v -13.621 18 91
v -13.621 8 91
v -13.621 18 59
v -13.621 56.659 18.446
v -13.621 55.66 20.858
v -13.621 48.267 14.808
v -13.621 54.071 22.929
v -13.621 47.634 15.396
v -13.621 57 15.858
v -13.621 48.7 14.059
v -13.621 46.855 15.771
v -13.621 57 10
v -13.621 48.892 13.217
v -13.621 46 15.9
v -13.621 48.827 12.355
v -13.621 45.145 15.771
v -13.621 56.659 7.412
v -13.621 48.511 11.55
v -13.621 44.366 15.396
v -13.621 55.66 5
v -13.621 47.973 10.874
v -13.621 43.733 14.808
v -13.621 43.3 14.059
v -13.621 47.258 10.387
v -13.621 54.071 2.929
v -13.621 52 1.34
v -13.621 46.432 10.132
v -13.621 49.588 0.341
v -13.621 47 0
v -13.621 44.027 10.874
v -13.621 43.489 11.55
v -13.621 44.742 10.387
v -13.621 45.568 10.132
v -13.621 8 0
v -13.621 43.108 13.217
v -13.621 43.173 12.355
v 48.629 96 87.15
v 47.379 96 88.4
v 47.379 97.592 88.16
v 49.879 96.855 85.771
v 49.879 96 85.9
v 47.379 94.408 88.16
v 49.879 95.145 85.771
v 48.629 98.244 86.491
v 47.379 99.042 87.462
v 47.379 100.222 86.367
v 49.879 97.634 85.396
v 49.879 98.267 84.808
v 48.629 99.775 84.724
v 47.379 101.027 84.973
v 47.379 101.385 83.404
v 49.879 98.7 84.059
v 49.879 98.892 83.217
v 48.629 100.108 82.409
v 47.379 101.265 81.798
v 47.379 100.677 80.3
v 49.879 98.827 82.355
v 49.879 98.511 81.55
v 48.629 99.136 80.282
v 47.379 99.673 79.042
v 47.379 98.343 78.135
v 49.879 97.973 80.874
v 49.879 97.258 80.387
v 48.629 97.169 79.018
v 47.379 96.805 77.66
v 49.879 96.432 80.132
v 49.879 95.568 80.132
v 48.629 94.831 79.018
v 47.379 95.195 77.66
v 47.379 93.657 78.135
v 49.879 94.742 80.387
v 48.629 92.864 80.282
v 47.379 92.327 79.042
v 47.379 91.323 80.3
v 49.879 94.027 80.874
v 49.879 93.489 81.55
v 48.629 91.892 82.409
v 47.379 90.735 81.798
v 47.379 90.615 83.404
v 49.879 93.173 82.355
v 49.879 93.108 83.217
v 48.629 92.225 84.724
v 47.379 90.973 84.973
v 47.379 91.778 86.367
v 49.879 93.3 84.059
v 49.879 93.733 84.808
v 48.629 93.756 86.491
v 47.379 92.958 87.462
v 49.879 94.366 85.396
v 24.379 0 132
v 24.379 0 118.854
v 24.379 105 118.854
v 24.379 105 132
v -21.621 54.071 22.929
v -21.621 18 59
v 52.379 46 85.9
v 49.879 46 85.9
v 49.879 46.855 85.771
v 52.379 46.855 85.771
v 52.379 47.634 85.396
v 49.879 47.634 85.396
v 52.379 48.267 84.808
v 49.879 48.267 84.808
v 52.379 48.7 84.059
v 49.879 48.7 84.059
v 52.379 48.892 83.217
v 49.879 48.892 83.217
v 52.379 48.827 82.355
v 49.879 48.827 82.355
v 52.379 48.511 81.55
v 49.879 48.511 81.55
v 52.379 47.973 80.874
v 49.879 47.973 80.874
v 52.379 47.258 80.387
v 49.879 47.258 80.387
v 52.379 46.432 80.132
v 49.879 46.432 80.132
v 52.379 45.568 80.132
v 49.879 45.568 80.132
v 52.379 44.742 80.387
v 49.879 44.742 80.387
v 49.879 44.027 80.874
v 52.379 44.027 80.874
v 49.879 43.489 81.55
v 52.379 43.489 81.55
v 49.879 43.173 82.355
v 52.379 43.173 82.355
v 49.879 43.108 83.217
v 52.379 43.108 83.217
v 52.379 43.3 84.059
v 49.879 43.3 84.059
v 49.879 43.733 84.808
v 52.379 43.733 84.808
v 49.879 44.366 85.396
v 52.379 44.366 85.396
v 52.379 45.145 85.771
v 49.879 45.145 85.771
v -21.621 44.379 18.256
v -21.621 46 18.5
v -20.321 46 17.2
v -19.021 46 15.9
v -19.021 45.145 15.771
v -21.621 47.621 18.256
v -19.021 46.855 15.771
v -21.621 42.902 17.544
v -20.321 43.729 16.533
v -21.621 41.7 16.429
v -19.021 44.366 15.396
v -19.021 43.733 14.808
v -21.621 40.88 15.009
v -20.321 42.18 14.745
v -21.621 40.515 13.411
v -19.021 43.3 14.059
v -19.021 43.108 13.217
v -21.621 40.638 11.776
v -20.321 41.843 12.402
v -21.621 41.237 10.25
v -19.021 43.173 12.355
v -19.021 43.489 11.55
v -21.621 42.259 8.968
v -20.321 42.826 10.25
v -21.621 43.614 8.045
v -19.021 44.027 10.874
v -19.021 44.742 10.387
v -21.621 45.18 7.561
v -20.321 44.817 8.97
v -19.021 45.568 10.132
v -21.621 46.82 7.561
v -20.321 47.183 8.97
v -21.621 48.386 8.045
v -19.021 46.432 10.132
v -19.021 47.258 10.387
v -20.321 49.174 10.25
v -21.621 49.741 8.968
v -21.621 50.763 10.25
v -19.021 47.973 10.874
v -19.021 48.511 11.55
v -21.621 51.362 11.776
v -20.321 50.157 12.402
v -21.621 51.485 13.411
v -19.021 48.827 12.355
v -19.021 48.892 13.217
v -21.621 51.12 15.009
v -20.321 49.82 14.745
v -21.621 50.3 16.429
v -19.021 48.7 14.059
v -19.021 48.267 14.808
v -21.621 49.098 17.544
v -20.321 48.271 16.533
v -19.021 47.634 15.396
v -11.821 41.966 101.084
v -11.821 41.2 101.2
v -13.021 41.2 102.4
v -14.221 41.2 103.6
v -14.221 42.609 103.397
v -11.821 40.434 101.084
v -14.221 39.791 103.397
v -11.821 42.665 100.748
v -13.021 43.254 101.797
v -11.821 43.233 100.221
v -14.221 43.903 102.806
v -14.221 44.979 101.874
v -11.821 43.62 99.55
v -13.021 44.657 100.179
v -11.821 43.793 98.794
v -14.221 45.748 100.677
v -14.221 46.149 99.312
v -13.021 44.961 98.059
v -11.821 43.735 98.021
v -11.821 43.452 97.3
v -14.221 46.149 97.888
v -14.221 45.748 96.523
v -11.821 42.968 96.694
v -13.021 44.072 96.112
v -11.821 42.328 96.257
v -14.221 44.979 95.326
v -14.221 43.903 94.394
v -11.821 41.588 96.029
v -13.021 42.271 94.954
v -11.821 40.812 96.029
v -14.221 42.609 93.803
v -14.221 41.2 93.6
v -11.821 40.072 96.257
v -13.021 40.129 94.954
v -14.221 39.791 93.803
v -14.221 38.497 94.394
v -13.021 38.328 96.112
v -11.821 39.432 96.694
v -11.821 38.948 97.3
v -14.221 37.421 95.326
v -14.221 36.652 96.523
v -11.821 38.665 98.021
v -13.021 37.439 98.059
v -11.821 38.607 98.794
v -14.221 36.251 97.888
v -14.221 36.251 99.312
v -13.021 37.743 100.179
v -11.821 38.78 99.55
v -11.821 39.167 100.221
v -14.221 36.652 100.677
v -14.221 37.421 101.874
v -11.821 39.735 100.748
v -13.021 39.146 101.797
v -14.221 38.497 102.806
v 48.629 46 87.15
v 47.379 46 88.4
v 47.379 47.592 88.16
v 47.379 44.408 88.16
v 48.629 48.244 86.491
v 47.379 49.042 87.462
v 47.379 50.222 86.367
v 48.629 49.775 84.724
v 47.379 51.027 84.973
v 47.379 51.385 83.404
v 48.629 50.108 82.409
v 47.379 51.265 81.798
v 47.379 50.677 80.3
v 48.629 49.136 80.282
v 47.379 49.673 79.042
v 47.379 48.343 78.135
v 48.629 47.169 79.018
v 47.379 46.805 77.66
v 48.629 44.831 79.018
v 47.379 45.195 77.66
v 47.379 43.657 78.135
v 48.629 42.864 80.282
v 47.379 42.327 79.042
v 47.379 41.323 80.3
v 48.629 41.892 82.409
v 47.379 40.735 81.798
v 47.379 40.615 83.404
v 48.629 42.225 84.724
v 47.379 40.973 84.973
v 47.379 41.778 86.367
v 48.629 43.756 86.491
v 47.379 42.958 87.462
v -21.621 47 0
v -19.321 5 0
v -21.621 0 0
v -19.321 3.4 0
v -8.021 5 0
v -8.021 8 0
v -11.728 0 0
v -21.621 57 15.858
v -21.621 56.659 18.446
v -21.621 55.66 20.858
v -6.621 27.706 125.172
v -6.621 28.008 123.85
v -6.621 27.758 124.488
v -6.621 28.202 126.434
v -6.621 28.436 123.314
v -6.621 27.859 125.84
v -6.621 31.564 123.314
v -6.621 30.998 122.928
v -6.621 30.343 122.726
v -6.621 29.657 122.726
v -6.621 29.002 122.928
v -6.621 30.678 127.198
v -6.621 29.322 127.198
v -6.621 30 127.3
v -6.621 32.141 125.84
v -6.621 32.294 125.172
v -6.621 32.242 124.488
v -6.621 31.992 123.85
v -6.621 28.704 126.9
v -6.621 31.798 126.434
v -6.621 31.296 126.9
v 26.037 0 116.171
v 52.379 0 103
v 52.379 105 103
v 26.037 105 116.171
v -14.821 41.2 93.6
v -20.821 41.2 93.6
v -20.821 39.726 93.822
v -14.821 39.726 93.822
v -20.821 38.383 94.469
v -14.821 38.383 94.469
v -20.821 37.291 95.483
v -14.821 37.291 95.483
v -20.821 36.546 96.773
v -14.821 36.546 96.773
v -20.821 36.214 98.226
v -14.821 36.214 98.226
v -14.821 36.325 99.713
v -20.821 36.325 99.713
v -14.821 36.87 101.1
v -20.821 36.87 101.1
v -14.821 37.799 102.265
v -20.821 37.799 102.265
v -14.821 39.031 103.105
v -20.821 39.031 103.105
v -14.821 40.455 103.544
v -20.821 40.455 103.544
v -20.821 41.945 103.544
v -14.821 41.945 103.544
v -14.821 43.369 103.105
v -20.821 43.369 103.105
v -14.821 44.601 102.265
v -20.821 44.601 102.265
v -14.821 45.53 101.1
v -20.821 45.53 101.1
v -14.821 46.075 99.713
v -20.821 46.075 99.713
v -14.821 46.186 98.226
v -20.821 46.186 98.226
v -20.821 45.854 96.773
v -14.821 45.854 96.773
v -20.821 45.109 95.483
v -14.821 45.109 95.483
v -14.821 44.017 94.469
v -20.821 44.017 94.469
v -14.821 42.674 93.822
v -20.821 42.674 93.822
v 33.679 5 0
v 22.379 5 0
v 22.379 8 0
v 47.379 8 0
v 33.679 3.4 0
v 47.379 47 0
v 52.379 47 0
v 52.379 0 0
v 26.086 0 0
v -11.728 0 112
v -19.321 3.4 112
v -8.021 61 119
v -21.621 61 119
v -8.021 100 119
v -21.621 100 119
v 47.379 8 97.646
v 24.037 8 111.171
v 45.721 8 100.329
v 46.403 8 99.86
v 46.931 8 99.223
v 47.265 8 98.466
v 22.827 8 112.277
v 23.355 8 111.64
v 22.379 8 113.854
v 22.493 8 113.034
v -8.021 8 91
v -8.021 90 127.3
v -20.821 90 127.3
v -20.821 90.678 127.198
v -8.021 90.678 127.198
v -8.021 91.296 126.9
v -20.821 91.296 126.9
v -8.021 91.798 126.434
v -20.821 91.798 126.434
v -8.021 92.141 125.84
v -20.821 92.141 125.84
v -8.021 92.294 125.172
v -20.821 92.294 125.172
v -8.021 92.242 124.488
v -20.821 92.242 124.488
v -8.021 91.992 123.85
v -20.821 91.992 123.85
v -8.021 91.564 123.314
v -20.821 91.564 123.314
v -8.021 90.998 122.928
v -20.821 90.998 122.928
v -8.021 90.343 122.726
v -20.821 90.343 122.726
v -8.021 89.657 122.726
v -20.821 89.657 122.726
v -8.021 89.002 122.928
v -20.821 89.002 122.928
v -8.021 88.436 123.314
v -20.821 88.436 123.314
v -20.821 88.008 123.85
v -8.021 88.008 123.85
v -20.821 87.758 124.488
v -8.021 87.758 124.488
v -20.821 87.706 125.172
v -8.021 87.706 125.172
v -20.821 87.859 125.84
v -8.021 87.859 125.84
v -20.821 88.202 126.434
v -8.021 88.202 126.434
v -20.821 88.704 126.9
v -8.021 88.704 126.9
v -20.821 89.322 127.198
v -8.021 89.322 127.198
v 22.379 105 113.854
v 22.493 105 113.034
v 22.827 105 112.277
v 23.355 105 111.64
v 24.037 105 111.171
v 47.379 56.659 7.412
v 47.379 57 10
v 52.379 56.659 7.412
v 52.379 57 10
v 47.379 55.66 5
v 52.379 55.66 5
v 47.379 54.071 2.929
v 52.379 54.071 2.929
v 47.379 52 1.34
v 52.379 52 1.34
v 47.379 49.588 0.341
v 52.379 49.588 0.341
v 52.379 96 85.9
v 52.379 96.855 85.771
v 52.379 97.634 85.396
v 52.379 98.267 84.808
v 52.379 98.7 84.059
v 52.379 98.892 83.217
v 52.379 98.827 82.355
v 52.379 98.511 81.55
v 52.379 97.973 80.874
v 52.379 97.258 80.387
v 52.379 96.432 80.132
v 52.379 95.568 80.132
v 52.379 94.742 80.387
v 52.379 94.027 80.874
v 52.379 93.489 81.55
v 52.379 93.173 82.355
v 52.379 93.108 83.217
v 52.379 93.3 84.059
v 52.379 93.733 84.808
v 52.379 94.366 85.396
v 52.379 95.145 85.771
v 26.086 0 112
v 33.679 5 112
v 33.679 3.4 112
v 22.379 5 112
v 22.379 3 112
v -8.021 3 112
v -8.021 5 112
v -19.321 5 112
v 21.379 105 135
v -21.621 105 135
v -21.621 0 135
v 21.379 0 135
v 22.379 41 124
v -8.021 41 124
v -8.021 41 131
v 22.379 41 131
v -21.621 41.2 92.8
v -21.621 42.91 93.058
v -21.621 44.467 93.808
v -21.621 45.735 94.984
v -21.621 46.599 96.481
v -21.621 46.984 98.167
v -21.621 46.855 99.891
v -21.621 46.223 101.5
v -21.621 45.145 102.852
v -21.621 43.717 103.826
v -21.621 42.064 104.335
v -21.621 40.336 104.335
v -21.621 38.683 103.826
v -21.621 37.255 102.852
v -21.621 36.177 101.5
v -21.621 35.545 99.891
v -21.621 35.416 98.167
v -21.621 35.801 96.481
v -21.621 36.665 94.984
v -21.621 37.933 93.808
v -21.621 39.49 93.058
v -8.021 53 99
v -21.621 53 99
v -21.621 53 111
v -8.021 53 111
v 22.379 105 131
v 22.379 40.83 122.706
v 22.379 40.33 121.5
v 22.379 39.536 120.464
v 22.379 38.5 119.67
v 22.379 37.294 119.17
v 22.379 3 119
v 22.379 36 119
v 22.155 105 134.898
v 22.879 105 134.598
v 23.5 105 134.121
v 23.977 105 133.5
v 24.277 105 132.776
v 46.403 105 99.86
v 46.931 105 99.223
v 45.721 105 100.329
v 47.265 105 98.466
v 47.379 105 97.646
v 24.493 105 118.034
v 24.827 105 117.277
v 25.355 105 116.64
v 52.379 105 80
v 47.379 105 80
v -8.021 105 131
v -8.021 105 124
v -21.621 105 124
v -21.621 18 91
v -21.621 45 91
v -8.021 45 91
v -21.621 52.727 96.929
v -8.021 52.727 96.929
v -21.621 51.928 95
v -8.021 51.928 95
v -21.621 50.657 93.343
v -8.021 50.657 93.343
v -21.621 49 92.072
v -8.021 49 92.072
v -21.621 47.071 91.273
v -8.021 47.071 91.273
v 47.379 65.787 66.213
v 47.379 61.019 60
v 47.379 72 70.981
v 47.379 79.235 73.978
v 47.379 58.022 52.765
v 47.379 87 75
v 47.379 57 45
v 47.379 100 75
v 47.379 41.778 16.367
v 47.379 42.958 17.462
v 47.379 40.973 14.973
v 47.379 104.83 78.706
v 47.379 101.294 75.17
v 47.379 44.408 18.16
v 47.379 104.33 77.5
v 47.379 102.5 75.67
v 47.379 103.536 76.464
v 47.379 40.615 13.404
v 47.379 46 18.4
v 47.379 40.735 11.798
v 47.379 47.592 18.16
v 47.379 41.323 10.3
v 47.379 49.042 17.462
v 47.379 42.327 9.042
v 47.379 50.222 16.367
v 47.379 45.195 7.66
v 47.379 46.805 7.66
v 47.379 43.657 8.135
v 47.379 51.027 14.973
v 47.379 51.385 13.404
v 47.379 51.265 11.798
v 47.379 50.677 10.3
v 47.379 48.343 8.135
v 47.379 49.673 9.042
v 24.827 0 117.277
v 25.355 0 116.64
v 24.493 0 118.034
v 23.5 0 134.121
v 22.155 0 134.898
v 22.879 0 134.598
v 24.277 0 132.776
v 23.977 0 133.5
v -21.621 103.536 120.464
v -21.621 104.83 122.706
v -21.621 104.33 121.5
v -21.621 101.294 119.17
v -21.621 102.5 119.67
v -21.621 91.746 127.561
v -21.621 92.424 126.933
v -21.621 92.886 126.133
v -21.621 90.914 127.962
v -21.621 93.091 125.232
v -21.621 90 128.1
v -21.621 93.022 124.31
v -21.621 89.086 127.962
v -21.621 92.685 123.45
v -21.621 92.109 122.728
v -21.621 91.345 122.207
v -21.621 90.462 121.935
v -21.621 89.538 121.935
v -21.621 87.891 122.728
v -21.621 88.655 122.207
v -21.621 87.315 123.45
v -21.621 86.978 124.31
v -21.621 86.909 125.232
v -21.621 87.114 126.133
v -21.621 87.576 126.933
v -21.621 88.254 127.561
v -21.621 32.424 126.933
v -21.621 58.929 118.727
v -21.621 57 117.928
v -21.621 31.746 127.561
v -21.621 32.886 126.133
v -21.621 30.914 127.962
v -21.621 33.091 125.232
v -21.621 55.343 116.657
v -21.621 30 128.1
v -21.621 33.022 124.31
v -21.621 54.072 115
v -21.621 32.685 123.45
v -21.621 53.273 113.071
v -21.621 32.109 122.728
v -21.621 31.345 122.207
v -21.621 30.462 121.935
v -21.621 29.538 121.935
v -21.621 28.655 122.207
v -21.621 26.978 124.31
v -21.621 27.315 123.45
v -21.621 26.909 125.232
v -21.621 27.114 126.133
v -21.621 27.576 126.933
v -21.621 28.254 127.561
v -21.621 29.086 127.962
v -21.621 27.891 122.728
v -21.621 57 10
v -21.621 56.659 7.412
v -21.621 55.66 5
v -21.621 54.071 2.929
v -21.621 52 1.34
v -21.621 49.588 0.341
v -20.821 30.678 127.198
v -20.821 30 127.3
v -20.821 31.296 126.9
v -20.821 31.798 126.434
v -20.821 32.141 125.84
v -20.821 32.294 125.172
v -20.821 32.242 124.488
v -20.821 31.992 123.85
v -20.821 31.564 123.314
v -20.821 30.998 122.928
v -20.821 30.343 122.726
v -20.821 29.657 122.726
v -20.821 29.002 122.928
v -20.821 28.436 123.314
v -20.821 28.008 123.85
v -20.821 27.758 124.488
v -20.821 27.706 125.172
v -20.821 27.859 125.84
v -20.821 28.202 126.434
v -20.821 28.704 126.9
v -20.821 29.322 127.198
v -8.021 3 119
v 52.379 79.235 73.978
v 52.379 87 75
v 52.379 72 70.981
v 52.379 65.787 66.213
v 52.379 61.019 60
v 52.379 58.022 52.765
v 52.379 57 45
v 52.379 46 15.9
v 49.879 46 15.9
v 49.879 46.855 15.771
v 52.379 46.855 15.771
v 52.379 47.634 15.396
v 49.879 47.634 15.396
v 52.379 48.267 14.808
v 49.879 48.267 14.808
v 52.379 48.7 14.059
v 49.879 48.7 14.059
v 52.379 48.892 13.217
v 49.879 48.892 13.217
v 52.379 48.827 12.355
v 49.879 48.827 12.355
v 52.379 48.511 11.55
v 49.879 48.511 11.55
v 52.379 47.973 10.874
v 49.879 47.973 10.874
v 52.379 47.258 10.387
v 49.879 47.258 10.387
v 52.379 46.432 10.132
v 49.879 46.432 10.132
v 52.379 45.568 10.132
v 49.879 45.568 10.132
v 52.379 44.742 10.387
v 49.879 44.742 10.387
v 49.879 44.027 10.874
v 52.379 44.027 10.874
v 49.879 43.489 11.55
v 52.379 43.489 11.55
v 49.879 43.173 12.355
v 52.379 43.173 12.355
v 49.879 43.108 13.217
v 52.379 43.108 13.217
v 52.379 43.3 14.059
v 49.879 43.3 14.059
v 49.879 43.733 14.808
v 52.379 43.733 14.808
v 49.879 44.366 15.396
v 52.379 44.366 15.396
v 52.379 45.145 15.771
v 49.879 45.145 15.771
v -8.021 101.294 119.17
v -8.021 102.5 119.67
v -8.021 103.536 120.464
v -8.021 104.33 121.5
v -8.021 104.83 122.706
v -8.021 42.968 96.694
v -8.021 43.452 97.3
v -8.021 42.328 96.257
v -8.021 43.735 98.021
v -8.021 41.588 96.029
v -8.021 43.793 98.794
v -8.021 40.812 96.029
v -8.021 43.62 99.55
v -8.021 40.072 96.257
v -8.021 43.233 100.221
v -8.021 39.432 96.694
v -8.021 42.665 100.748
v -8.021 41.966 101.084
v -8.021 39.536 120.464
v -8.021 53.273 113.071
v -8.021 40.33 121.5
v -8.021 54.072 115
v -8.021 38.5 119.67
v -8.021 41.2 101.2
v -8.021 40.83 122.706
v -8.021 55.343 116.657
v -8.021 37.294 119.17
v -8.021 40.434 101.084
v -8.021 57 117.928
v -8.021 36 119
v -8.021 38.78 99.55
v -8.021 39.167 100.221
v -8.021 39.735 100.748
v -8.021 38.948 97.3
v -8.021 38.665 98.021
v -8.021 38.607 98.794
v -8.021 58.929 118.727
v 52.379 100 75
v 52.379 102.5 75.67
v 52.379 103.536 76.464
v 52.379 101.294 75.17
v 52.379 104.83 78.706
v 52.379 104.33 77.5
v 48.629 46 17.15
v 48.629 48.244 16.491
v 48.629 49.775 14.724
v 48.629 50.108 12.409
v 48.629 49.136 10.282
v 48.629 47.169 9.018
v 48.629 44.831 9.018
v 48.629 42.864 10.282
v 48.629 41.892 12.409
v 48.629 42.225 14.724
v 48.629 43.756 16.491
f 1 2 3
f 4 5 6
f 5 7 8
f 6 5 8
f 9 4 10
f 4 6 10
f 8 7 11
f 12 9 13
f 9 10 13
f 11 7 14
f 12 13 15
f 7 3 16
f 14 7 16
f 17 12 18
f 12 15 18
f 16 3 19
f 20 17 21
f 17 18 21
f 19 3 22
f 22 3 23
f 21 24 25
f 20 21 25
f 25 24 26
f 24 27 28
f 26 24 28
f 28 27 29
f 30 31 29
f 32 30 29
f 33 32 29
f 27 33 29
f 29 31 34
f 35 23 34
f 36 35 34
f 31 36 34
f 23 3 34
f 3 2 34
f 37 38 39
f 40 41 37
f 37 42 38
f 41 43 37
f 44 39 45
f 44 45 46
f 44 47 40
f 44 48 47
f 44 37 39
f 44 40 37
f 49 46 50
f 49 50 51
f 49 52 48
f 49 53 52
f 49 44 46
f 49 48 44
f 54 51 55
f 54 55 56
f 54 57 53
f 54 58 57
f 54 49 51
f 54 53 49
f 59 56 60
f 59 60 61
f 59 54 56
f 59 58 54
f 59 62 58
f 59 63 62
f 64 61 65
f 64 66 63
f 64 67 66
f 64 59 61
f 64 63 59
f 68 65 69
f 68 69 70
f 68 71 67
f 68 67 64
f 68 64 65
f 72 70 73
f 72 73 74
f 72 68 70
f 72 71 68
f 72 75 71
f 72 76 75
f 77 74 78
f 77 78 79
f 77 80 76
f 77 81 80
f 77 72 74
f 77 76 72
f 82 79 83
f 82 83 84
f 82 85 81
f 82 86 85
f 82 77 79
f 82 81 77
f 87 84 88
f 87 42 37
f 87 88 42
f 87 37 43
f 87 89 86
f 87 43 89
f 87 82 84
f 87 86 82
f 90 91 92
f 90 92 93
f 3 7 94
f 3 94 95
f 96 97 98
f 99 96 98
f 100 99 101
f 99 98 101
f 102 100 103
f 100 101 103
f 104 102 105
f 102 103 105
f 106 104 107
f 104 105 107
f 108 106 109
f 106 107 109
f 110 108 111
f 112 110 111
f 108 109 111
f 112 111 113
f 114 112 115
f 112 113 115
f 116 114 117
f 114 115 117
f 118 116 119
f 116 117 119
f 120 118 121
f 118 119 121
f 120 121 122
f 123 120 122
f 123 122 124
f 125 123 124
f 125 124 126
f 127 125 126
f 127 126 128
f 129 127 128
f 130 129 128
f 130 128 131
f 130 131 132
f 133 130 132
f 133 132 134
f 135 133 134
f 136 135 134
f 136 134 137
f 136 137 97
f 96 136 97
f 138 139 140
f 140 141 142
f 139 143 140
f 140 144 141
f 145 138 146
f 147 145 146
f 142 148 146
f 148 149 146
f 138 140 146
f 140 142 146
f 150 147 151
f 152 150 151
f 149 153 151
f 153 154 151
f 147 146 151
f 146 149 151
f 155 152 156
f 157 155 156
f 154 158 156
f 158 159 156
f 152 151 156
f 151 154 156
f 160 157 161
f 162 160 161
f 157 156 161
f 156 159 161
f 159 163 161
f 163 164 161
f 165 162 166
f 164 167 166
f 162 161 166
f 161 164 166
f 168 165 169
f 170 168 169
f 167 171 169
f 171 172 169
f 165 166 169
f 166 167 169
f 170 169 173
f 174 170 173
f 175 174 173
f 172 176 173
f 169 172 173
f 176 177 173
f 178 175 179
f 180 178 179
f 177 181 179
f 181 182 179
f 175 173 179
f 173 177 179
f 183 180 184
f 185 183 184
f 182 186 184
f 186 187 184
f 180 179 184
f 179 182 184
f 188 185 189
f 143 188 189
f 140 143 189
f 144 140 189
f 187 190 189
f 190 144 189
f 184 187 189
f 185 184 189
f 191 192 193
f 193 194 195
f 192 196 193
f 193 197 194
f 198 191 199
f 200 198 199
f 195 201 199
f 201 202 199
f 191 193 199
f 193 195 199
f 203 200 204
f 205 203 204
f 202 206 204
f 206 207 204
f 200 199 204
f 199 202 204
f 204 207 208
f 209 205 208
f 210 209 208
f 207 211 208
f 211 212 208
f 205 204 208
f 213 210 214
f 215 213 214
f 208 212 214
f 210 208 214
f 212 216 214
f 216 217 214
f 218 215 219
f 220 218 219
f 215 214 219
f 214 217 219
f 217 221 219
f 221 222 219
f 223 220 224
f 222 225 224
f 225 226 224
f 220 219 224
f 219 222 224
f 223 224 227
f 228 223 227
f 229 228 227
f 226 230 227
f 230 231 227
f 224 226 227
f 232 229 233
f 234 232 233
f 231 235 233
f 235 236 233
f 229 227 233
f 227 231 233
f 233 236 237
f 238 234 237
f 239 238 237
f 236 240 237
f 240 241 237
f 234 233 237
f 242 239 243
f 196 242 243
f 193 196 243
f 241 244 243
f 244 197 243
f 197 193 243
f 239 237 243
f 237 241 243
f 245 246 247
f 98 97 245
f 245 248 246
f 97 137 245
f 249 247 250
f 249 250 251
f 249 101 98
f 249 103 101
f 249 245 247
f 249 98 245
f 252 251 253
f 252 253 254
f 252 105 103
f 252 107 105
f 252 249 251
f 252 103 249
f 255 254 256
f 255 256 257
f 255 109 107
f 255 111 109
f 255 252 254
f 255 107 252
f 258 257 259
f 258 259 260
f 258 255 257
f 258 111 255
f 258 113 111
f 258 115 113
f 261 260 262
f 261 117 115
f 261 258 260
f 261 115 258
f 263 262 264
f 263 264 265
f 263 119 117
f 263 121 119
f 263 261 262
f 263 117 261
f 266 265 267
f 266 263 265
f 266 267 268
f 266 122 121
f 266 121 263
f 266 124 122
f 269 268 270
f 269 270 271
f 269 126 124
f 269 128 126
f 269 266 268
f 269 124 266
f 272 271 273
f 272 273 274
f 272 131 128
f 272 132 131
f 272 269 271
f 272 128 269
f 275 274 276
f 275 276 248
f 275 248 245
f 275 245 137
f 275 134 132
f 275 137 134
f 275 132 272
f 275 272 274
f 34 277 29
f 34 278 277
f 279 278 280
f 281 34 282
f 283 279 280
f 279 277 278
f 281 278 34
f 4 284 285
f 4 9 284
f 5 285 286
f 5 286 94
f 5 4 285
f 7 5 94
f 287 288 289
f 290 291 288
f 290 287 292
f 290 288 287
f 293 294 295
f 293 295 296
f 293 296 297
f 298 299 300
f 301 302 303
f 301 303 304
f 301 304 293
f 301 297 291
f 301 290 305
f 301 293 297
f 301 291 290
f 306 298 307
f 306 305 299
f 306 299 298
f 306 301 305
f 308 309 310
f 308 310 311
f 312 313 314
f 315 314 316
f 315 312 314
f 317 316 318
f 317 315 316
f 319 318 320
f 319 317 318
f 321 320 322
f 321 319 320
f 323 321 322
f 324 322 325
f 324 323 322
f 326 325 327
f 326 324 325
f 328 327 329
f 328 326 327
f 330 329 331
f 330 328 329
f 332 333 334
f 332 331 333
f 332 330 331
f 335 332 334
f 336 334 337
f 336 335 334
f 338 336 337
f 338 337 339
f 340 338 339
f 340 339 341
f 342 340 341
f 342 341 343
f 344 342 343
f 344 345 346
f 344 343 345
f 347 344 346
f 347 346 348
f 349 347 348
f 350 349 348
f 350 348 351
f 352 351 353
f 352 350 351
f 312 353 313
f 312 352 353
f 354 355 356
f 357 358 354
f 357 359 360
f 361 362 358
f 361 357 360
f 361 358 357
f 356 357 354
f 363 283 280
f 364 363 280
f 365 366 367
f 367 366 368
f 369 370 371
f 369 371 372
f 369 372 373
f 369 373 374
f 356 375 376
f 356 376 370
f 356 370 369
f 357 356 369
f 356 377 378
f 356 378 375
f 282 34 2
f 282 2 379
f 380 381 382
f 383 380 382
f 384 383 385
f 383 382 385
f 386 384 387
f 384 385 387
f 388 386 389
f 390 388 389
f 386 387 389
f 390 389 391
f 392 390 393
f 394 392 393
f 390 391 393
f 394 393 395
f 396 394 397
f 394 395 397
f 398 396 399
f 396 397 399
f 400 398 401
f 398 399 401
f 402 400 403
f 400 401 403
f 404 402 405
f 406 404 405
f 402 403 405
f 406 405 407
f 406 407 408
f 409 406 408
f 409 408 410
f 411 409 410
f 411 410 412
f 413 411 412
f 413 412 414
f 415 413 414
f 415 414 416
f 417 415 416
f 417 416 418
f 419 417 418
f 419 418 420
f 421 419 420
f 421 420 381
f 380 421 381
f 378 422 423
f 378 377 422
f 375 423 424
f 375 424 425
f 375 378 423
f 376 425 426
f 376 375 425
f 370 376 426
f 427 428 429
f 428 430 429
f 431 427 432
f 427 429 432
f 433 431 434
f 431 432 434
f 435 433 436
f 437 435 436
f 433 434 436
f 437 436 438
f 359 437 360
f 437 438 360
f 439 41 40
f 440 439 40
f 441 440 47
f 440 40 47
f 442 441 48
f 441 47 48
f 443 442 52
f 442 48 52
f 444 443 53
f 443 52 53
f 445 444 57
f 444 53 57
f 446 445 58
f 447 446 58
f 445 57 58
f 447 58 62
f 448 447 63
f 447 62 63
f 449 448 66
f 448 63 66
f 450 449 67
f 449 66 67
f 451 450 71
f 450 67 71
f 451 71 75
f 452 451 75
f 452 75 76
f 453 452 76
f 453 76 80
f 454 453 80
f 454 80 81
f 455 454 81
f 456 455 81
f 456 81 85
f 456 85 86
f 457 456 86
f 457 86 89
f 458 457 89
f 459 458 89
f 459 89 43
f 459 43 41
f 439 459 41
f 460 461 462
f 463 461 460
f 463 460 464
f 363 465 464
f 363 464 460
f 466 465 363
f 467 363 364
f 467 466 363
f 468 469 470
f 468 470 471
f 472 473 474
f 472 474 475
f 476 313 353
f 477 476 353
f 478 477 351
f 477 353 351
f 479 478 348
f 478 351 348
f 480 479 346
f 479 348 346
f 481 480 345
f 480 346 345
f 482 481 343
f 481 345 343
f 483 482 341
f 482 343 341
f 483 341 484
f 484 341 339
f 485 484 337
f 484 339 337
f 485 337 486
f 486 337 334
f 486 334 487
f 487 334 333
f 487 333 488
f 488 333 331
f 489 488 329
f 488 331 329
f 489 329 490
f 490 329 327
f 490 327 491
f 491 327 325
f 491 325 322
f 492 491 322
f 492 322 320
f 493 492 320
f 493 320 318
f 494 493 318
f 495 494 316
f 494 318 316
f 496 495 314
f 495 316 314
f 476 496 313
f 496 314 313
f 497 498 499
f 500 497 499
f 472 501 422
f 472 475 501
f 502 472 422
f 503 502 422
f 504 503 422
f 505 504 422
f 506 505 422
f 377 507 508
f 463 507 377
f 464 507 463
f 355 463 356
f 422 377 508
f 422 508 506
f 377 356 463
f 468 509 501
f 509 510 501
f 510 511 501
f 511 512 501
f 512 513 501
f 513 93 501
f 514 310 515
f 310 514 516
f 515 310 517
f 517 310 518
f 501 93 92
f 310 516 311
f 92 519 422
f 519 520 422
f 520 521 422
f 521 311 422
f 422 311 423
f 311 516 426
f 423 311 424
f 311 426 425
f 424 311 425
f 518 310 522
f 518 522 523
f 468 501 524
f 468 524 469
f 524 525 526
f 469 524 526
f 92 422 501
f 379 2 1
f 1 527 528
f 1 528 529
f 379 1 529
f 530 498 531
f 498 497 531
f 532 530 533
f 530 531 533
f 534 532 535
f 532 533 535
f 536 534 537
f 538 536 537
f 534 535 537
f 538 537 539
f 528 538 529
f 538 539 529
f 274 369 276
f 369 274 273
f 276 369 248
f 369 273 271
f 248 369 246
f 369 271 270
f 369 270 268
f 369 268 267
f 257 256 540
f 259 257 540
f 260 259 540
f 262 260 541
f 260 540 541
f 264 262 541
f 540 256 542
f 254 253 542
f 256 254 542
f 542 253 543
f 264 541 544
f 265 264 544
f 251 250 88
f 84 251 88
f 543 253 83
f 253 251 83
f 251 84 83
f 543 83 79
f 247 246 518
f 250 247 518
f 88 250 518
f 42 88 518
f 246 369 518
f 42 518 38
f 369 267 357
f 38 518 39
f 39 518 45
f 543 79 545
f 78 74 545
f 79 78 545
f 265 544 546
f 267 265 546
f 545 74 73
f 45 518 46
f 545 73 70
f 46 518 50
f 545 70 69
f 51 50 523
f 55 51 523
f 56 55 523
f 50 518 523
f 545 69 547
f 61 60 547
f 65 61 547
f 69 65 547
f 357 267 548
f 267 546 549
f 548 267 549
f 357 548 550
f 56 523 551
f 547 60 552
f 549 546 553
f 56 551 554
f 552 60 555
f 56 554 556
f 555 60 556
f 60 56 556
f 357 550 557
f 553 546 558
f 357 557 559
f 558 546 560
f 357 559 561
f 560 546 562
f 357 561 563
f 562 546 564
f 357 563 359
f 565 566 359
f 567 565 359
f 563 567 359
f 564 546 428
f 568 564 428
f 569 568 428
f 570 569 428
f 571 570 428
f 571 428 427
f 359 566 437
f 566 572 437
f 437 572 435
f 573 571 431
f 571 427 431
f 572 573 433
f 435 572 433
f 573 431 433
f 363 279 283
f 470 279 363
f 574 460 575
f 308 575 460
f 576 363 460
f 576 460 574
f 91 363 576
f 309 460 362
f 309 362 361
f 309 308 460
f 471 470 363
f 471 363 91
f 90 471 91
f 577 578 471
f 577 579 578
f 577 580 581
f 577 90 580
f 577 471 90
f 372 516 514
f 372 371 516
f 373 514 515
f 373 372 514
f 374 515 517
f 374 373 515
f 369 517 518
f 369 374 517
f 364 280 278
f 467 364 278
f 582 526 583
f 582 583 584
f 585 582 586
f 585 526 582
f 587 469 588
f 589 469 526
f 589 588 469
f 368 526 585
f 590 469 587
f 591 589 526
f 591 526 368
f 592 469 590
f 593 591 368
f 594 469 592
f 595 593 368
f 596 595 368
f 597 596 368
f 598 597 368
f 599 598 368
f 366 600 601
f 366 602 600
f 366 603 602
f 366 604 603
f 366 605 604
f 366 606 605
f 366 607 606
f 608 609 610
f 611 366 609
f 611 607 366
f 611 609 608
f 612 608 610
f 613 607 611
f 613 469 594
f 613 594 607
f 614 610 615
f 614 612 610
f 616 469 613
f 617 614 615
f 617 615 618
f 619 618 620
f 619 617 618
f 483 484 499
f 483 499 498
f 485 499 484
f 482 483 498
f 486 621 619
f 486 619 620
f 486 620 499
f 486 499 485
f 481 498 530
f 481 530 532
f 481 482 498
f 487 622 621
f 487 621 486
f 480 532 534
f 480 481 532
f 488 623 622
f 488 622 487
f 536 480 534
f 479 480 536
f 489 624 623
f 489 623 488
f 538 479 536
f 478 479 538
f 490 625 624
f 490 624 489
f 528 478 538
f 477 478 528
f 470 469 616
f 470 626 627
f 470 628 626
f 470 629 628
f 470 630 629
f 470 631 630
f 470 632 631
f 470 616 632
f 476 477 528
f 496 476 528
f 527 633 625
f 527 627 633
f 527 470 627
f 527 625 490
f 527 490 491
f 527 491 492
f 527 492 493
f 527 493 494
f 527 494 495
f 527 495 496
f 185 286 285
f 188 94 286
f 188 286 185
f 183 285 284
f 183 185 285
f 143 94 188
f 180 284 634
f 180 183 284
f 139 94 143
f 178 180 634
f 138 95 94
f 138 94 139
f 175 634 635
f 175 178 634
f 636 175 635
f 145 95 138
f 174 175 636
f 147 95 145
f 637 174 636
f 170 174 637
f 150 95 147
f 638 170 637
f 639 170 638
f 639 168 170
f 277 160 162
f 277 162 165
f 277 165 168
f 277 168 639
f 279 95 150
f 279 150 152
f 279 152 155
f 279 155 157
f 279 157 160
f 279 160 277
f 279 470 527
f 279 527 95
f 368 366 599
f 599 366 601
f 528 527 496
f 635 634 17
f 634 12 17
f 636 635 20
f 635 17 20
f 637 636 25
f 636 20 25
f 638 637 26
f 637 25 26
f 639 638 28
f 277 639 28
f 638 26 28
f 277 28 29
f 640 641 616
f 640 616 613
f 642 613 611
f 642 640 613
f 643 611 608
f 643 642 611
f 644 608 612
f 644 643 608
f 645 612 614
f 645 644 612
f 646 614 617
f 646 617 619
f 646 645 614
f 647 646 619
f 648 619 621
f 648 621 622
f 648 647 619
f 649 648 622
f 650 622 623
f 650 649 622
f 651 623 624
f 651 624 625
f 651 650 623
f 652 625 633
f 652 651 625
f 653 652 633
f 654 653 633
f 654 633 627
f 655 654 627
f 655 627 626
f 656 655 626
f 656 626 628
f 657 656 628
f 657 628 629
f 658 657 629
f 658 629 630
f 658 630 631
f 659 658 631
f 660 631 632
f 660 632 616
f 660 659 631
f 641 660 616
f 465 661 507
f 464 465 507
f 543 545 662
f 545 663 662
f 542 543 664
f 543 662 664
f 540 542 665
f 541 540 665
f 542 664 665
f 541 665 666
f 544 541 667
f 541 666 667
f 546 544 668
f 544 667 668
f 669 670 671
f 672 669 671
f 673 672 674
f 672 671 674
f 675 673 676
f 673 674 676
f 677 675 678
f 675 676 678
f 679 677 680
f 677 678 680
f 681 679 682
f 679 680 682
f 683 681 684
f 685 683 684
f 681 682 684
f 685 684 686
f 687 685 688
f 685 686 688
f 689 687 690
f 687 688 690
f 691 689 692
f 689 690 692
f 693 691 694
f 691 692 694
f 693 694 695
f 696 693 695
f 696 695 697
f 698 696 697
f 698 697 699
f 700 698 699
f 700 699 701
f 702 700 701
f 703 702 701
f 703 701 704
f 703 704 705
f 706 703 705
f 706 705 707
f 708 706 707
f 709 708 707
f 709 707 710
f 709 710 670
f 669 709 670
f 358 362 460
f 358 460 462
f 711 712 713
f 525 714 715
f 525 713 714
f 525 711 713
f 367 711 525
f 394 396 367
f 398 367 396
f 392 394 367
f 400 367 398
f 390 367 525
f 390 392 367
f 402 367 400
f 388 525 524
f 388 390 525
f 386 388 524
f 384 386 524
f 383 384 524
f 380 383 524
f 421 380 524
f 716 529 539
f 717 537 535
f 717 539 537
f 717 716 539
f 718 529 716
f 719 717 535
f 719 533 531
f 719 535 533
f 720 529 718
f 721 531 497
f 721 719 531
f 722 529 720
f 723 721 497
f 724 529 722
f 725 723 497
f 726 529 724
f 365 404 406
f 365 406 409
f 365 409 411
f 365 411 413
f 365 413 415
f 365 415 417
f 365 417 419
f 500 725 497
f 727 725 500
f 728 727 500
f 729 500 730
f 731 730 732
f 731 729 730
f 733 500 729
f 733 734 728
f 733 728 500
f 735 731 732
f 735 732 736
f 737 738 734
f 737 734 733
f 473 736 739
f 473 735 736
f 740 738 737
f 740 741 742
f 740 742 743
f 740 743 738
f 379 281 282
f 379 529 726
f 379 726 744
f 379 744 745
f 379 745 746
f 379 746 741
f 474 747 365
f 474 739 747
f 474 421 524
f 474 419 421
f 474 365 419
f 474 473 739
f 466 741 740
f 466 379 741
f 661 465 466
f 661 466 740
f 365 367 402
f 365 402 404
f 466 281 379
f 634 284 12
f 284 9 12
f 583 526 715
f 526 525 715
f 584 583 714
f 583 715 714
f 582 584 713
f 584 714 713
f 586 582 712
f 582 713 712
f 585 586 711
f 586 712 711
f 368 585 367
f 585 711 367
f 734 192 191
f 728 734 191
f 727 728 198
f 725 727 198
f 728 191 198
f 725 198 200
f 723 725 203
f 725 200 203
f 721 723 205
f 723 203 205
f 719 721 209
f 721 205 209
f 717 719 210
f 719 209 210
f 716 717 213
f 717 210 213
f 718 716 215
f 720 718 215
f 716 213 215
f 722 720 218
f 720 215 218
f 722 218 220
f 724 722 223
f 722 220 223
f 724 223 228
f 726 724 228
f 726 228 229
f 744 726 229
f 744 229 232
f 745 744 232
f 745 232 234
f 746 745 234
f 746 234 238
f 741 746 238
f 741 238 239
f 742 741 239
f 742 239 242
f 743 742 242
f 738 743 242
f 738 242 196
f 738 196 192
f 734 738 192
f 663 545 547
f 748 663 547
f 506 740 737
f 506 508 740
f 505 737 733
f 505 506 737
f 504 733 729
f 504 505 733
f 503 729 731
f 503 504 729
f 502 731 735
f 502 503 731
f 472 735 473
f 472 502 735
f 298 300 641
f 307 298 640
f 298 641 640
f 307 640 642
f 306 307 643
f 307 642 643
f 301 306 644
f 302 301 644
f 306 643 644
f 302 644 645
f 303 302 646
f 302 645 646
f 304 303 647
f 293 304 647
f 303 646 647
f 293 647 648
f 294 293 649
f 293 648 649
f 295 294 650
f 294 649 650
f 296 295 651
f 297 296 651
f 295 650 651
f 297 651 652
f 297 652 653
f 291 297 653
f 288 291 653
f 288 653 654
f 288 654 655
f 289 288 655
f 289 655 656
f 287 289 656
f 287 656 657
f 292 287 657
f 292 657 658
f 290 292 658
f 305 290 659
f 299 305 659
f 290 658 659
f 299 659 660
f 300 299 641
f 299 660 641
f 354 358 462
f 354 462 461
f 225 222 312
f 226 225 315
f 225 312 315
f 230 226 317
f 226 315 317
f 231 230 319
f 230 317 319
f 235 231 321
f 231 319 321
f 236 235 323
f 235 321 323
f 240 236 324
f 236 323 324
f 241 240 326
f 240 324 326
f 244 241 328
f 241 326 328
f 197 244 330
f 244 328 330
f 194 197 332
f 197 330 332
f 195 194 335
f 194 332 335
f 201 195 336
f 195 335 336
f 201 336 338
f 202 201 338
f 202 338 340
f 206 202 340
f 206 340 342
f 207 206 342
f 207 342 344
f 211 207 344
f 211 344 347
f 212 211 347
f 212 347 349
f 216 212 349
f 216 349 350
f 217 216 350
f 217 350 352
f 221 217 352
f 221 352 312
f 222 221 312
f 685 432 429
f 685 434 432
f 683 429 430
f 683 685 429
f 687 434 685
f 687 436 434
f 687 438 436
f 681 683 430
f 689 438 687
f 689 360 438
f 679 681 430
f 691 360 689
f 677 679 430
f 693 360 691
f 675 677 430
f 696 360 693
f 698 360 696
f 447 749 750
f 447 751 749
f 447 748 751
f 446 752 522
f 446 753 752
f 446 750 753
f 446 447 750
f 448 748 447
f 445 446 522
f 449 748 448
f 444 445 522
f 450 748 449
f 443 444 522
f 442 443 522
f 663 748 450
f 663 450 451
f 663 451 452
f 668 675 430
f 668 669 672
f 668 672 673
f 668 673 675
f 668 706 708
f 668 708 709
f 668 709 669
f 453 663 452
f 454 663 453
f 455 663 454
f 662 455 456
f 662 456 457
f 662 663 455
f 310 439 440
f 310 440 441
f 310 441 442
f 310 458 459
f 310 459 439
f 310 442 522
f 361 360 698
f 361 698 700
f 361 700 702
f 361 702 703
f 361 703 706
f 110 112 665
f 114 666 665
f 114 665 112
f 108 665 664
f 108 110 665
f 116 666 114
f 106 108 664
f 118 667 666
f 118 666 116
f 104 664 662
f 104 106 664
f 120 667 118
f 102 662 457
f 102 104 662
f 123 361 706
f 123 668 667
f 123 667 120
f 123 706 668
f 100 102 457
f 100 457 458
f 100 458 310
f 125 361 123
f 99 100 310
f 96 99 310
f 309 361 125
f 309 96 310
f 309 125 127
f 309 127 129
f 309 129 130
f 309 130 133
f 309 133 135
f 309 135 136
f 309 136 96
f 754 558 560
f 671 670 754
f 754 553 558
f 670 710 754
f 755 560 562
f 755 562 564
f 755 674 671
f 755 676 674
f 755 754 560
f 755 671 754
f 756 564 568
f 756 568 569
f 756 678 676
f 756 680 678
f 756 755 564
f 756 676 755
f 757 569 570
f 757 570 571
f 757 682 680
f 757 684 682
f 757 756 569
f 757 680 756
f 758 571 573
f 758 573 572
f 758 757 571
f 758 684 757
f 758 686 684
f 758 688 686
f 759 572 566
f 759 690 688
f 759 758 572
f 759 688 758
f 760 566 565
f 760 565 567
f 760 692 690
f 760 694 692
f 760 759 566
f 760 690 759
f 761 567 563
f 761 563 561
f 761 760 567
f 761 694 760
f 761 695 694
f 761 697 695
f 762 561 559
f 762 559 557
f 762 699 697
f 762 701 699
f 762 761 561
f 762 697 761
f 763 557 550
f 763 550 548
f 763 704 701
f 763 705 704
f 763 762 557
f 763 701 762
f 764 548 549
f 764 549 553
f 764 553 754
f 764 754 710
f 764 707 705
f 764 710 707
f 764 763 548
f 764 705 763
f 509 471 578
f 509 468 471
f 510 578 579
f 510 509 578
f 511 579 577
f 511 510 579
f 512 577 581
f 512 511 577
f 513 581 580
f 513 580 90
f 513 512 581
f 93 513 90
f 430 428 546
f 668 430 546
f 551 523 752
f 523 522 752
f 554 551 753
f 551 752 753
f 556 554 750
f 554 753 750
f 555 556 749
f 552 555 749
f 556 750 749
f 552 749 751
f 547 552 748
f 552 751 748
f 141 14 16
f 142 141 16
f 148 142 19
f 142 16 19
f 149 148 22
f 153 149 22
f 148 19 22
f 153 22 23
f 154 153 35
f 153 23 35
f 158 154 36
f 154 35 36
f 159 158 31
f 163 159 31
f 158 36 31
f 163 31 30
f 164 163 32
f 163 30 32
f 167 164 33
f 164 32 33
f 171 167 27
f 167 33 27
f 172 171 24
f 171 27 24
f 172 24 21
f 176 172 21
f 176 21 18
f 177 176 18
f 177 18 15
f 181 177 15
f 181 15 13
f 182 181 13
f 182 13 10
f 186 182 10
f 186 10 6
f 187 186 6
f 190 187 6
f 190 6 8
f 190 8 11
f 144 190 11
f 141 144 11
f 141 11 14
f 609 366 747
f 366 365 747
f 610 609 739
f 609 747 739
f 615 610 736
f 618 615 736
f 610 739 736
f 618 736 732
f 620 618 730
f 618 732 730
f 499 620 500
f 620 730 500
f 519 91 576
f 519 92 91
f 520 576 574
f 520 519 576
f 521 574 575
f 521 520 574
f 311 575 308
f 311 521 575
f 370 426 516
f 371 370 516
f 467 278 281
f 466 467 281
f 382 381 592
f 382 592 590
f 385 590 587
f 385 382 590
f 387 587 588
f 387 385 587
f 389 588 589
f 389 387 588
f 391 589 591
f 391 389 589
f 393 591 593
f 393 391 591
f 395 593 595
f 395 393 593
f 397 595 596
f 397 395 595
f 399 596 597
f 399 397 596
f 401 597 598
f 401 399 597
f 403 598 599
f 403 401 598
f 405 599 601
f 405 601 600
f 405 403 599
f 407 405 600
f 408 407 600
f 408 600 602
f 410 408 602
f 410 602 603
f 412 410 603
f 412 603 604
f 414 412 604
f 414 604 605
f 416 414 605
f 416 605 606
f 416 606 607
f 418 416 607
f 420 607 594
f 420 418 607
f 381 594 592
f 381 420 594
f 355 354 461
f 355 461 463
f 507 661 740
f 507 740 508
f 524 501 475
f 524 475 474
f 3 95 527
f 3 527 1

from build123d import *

# Parameters (mm, degrees)
EXTRUDE_1_DEPTH          = 105
SKETCH_7_W               = 30.4
SKETCH_7_H               = 19
EXTRUDE_2_DEPTH          = 3
SKETCH_8_W               = 30.4
SKETCH_8_H               = 12
EXTRUDE_3_DEPTH          = 38
FILLET_1_R               = 5
CUT_EXTRUDE_1_DEPTH      = 112
CUT_EXTRUDE_2_DEPTH      = 97
CUT_EXTRUDE_4_DEPTH      = 187.349134691
CUT_EXTRUDE_4_DEPTH_BACK = 6.8
SKETCH_11_R              = 5
FILLET_3_R               = 3
SKETCH_12_R              = 2.6
CUT_EXTRUDE_5_DEPTH      = 20
CHAMFER_1_SIZE           = 3
SKETCH_13_R              = 2.9
CUT_EXTRUDE_6_DEPTH      = 187.349134691
CHAMFER_3_SIZE           = 2.5
SKETCH_16_W              = 75
SKETCH_16_H              = 48
CUT_EXTRUDE_9_DEPTH      = 187.349134691
FILLET_4_R               = 30
SKETCH_17_W              = 28
SKETCH_17_H              = 52
CUT_EXTRUDE_10_DEPTH     = 20
FILLET_5_R               = 8
SKETCH_18_W              = 8
SKETCH_18_H              = 19
EXTRUDE_4_DEPTH          = 49
CHAMFER_4_SIZE           = 50
FILLET_6_R               = 10
SKETCH_19_R              = 2.9
CUT_EXTRUDE_11_DEPTH     = 187.349134691
CHAMFER_5_SIZE           = 2.6
SKETCH_21_R              = 2.3
CUT_EXTRUDE_13_DEPTH     = 15
FILLET_7_R               = 5
CHAMFER_6_SIZE           = 0.8
SKETCH_22_W              = 8
SKETCH_22_H              = 43.683816014
EXTRUDE_5_DEPTH          = 10
FILLET_8_R               = 10


with BuildPart() as part:
    # Эскиз2 → Бобышка-Вытянуть1 (new body)
    with BuildSketch(Plane(origin=(0, 0, 0), x_dir=(1, 0, 0), z_dir=(0, 1, 0))):
        Polygon((52.378939236, 0), (52.378939236, -103), (24.378939236, -117), (24.378939236, -135), (0, -135), (-21.621060764, -135), (-21.621060764, 0), (-8.021060764, 0), (-8.021060764, -131), (0, -131), (22.378939236, -131), (22.378939236, 0), align=None)
    extrude(amount=EXTRUDE_1_DEPTH)



with BuildPart() as body_2:
    # Эскиз7 → Бобышка-Вытянуть2 (new body)
    with BuildSketch(Plane.XZ):
        with Locations((7.178939236, 121.5)):
            Rectangle(SKETCH_7_W, SKETCH_7_H)
    extrude(amount=-EXTRUDE_2_DEPTH)


with BuildPart() as part_1:
    add(part.part)

    add(body_2.part)  # Бобышка-Вытянуть3 merges body 2
    # Эскиз8 → Бобышка-Вытянуть3 (add)
    with BuildSketch(Plane(origin=(0, 3, 0), x_dir=(1, 0, 0), z_dir=(0, 1, 0))):
        with Locations((7.178939236, -125)):
            Rectangle(SKETCH_8_W, SKETCH_8_H)
    extrude(amount=EXTRUDE_3_DEPTH)

    # Скругление1
    fillet_1_edges = [part_1.edges().sort_by_distance(p)[0] for p in [
        (7.178939236, 41, 119),
    ]]
    fillet(fillet_1_edges, radius=FILLET_1_R)

    # Эскиз3 → Вырез-Вытянуть1 (cut)
    with BuildSketch(Plane(origin=(0, 0, 0), x_dir=(-1, 0, 0), z_dir=(0, 0, -1))):
        Polygon((8.021060764, -1.66), (19.321060764, 3.4), (19.321060764, 5), (8.021060764, 5), align=None)
        Polygon((-33.678939236, 5), (-22.378939236, 5), (-22.378939236, -1.66), (-33.678939236, 3.4), align=None)
    extrude(amount=-CUT_EXTRUDE_1_DEPTH, mode=Mode.SUBTRACT)

    # Эскиз9 → Вырез-Вытянуть2 (cut)
    with BuildSketch(Plane(origin=(0, 105, 0), x_dir=(1, 0, 0), z_dir=(0, 1, 0))):
        Polygon((-21.621060764, 0), (-21.621060764, -91), (22.378939236, -91), (22.378939236, -112), (47.378939236, -99.5), (47.378939236, 0), align=None)
    extrude(amount=-CUT_EXTRUDE_2_DEPTH, mode=Mode.SUBTRACT)

    # Эскиз11 → Вырез-Вытянуть4 (cut, two sides: drawn at the far end of the back side and taken through both)
    with BuildSketch(Plane.ZY.offset(21.621060764).offset(-CUT_EXTRUDE_4_DEPTH_BACK)):
        with Locations(Location((98.6, 41.2, 0), (0, 0, 180))):
            Circle(SKETCH_11_R)
    extrude(amount=CUT_EXTRUDE_4_DEPTH + CUT_EXTRUDE_4_DEPTH_BACK, mode=Mode.SUBTRACT)

    # Скругление3
    fillet_3_edges = [part_1.edges().sort_by_distance(p)[0] for p in [
        (47.378939236, 56.5, 99.5),
        (22.378939236, 56.5, 112),
        (24.378939236, 52.5, 135),
        (24.378939236, 52.5, 117),
    ]]
    fillet(fillet_3_edges, radius=FILLET_3_R)

    # Эскиз12 → Вырез-Вытянуть5 (cut)
    with BuildSketch(Plane.ZY.offset(21.621060764)):
        with Locations((98.6, 41.2)):
            Circle(SKETCH_12_R)
    extrude(amount=-CUT_EXTRUDE_5_DEPTH, mode=Mode.SUBTRACT)

    # Фаска1
    # the kernel refuses this chamfer: 3 mm, written as the material it takes off along each edge
    with BuildSketch(Plane(origin=(-14.821060764, 41.2, 98.6), x_dir=(0, 0, 1), z_dir=(0, -1, 0))) as chamfer_1_piece_1_section:
        Polygon((2.6, -CHAMFER_1_SIZE), (2.6 + CHAMFER_1_SIZE, 0), (2.6, 0), align=None)
    chamfer_1_piece_1 = revolve(axis=Axis((-14.821060764, 41.2, 98.6), (-1, 0, 0)), mode=Mode.PRIVATE)
    chamfer_1_piece_1 = chamfer_1_piece_1 & Plane(origin=(-13.01179882, 41.2, 98.6), x_dir=(0, 0, -1), z_dir=(-1, 0, 0)) * Cylinder(5, 23, mode=Mode.PRIVATE)
    add(chamfer_1_piece_1, mode=Mode.SUBTRACT)

    # Эскиз13 → Вырез-Вытянуть6 (cut, through all)
    with BuildSketch(Plane.ZY.offset(21.621060764)):
        with Locations((83, 46)):
            Circle(SKETCH_13_R)
        with Locations((13, 46)):
            Circle(SKETCH_13_R)
        with Locations((83, 96)):
            Circle(SKETCH_13_R)
    extrude(amount=-CUT_EXTRUDE_6_DEPTH, mode=Mode.SUBTRACT)

    # Фаска3
    chamfer_3_edges = [part_1.edges().sort_by_distance(p)[0] for p in [
        (47.378939236, 96, 80.1),
        (47.378939236, 46, 10.1),
        (47.378939236, 46, 80.1),
    ]]
    chamfer(chamfer_3_edges, length=CHAMFER_3_SIZE)

    # Эскиз16 → Вырез-Вытянуть9 (cut, through all)
    with BuildSketch(Plane.ZY.offset(21.621060764)):
        with Locations((37.5, 81)):
            Rectangle(SKETCH_16_W, SKETCH_16_H)
    extrude(amount=-CUT_EXTRUDE_9_DEPTH, mode=Mode.SUBTRACT)

    # Скругление4
    fillet_4_edges = [part_1.edges().sort_by_distance(p)[0] for p in [
        (49.878939236, 57, 75),
    ]]
    fillet(fillet_4_edges, radius=FILLET_4_R)

    # Эскиз17 → Вырез-Вытянуть10 (cut)
    with BuildSketch(Plane.ZY.offset(21.621060764)):
        with Locations((105, 79)):
            Rectangle(SKETCH_17_W, SKETCH_17_H)
    extrude(amount=-CUT_EXTRUDE_10_DEPTH, mode=Mode.SUBTRACT)

    # Скругление5
    fillet_5_edges = [part_1.edges().sort_by_distance(p)[0] for p in [
        (-14.821060764, 53, 91),
        (-14.821060764, 53, 119),
    ]]
    fillet(fillet_5_edges, radius=FILLET_5_R)

    # Эскиз18 → Бобышка-Вытянуть4 (add)
    with BuildSketch(Plane(origin=(0, 8, 0), x_dir=(1, 0, 0), z_dir=(0, 1, 0))):
        with Locations((-17.621060764, -9.5)):
            Rectangle(SKETCH_18_W, SKETCH_18_H)
    extrude(amount=EXTRUDE_4_DEPTH)

    # Фаска4
    # the kernel refuses this chamfer: 50 mm, written as the material it adds along each edge
    with BuildSketch(Plane(origin=(-13.621060764, 8, 19), x_dir=(0, 0.9996219169112966, -0.027495876610586386), z_dir=(-1, 0, 0))) as chamfer_4_piece_1_section:
        Polygon((CHAMFER_4_SIZE * 0.999621916911, -CHAMFER_4_SIZE * 0.0274958766106), (-CHAMFER_4_SIZE * 0.0274958766106, -CHAMFER_4_SIZE * 0.999621916911), (0, 0), align=None)
    chamfer_4_piece_1 = extrude(amount=8, mode=Mode.PRIVATE)
    chamfer_4_piece_1 = split(chamfer_4_piece_1, bisect_by=Plane(origin=(-17.621060764, 57, 35.555220818), z_dir=(0, -1, 0)), keep=Keep.TOP, mode=Mode.PRIVATE)
    add(chamfer_4_piece_1)

    # Скругление6
    fillet_6_edges = [part_1.edges().sort_by_distance(p)[0] for p in [
        (49.878939236, 57, 0),
        (-17.621060764, 57, 0),
    ]]
    fillet(fillet_6_edges, radius=FILLET_6_R)

    # Эскиз19 → Вырез-Вытянуть11 (cut, through all)
    with BuildSketch(Plane(origin=(52.378939236, 0, 0), x_dir=(0, 0, -1), z_dir=(1, 0, 0))):
        with Locations(Location((-13, 46, 0), (0, 0, 180))):
            Circle(SKETCH_19_R)
    extrude(amount=-CUT_EXTRUDE_11_DEPTH, mode=Mode.SUBTRACT)

    # Фаска5
    chamfer_5_edges = [part_1.edges().sort_by_distance(p)[0] for p in [
        (-21.621060764, 46, 10.1),
    ]]
    chamfer(chamfer_5_edges, length=CHAMFER_5_SIZE)

    # Эскиз21 → Вырез-Вытянуть13 (cut)
    with BuildSketch(Plane.ZY.offset(21.621060764)):
        with Locations((125, 30)):
            Circle(SKETCH_21_R)
        with Locations((125, 90)):
            Circle(SKETCH_21_R)
    extrude(amount=-CUT_EXTRUDE_13_DEPTH, mode=Mode.SUBTRACT)

    # Скругление7
    fillet_7_edges = [part_1.edges().sort_by_distance(p)[0] for p in [
        (49.878939236, 105, 75),
        (-14.821060764, 105, 119),
    ]]
    fillet(fillet_7_edges, radius=FILLET_7_R)

    # Фаска6
    chamfer_6_edges = [part_1.edges().sort_by_distance(p)[0] for p in [
        (-21.621060764, 41.2, 103.6),
        (-21.621060764, 30, 122.7),
        (-21.621060764, 90, 122.7),
    ]]
    chamfer(chamfer_6_edges, length=CHAMFER_6_SIZE)

    # Эскиз22 → Бобышка-Вытянуть5 (add)
    with BuildSketch(Plane(origin=(0, 8, 0), x_dir=(1, 0, 0), z_dir=(0, 1, 0))):
        with Locations((-17.621060764, -69.158091993)):
            Rectangle(SKETCH_22_W, SKETCH_22_H)
    extrude(amount=EXTRUDE_5_DEPTH)

    # Скругление8
    fillet_8_edges = [part_1.edges().sort_by_distance(p)[0] for p in [
        (-17.621060764, 57, 20),
    ]]
    fillet(fillet_8_edges, radius=FILLET_8_R)


solid = part_1.part
